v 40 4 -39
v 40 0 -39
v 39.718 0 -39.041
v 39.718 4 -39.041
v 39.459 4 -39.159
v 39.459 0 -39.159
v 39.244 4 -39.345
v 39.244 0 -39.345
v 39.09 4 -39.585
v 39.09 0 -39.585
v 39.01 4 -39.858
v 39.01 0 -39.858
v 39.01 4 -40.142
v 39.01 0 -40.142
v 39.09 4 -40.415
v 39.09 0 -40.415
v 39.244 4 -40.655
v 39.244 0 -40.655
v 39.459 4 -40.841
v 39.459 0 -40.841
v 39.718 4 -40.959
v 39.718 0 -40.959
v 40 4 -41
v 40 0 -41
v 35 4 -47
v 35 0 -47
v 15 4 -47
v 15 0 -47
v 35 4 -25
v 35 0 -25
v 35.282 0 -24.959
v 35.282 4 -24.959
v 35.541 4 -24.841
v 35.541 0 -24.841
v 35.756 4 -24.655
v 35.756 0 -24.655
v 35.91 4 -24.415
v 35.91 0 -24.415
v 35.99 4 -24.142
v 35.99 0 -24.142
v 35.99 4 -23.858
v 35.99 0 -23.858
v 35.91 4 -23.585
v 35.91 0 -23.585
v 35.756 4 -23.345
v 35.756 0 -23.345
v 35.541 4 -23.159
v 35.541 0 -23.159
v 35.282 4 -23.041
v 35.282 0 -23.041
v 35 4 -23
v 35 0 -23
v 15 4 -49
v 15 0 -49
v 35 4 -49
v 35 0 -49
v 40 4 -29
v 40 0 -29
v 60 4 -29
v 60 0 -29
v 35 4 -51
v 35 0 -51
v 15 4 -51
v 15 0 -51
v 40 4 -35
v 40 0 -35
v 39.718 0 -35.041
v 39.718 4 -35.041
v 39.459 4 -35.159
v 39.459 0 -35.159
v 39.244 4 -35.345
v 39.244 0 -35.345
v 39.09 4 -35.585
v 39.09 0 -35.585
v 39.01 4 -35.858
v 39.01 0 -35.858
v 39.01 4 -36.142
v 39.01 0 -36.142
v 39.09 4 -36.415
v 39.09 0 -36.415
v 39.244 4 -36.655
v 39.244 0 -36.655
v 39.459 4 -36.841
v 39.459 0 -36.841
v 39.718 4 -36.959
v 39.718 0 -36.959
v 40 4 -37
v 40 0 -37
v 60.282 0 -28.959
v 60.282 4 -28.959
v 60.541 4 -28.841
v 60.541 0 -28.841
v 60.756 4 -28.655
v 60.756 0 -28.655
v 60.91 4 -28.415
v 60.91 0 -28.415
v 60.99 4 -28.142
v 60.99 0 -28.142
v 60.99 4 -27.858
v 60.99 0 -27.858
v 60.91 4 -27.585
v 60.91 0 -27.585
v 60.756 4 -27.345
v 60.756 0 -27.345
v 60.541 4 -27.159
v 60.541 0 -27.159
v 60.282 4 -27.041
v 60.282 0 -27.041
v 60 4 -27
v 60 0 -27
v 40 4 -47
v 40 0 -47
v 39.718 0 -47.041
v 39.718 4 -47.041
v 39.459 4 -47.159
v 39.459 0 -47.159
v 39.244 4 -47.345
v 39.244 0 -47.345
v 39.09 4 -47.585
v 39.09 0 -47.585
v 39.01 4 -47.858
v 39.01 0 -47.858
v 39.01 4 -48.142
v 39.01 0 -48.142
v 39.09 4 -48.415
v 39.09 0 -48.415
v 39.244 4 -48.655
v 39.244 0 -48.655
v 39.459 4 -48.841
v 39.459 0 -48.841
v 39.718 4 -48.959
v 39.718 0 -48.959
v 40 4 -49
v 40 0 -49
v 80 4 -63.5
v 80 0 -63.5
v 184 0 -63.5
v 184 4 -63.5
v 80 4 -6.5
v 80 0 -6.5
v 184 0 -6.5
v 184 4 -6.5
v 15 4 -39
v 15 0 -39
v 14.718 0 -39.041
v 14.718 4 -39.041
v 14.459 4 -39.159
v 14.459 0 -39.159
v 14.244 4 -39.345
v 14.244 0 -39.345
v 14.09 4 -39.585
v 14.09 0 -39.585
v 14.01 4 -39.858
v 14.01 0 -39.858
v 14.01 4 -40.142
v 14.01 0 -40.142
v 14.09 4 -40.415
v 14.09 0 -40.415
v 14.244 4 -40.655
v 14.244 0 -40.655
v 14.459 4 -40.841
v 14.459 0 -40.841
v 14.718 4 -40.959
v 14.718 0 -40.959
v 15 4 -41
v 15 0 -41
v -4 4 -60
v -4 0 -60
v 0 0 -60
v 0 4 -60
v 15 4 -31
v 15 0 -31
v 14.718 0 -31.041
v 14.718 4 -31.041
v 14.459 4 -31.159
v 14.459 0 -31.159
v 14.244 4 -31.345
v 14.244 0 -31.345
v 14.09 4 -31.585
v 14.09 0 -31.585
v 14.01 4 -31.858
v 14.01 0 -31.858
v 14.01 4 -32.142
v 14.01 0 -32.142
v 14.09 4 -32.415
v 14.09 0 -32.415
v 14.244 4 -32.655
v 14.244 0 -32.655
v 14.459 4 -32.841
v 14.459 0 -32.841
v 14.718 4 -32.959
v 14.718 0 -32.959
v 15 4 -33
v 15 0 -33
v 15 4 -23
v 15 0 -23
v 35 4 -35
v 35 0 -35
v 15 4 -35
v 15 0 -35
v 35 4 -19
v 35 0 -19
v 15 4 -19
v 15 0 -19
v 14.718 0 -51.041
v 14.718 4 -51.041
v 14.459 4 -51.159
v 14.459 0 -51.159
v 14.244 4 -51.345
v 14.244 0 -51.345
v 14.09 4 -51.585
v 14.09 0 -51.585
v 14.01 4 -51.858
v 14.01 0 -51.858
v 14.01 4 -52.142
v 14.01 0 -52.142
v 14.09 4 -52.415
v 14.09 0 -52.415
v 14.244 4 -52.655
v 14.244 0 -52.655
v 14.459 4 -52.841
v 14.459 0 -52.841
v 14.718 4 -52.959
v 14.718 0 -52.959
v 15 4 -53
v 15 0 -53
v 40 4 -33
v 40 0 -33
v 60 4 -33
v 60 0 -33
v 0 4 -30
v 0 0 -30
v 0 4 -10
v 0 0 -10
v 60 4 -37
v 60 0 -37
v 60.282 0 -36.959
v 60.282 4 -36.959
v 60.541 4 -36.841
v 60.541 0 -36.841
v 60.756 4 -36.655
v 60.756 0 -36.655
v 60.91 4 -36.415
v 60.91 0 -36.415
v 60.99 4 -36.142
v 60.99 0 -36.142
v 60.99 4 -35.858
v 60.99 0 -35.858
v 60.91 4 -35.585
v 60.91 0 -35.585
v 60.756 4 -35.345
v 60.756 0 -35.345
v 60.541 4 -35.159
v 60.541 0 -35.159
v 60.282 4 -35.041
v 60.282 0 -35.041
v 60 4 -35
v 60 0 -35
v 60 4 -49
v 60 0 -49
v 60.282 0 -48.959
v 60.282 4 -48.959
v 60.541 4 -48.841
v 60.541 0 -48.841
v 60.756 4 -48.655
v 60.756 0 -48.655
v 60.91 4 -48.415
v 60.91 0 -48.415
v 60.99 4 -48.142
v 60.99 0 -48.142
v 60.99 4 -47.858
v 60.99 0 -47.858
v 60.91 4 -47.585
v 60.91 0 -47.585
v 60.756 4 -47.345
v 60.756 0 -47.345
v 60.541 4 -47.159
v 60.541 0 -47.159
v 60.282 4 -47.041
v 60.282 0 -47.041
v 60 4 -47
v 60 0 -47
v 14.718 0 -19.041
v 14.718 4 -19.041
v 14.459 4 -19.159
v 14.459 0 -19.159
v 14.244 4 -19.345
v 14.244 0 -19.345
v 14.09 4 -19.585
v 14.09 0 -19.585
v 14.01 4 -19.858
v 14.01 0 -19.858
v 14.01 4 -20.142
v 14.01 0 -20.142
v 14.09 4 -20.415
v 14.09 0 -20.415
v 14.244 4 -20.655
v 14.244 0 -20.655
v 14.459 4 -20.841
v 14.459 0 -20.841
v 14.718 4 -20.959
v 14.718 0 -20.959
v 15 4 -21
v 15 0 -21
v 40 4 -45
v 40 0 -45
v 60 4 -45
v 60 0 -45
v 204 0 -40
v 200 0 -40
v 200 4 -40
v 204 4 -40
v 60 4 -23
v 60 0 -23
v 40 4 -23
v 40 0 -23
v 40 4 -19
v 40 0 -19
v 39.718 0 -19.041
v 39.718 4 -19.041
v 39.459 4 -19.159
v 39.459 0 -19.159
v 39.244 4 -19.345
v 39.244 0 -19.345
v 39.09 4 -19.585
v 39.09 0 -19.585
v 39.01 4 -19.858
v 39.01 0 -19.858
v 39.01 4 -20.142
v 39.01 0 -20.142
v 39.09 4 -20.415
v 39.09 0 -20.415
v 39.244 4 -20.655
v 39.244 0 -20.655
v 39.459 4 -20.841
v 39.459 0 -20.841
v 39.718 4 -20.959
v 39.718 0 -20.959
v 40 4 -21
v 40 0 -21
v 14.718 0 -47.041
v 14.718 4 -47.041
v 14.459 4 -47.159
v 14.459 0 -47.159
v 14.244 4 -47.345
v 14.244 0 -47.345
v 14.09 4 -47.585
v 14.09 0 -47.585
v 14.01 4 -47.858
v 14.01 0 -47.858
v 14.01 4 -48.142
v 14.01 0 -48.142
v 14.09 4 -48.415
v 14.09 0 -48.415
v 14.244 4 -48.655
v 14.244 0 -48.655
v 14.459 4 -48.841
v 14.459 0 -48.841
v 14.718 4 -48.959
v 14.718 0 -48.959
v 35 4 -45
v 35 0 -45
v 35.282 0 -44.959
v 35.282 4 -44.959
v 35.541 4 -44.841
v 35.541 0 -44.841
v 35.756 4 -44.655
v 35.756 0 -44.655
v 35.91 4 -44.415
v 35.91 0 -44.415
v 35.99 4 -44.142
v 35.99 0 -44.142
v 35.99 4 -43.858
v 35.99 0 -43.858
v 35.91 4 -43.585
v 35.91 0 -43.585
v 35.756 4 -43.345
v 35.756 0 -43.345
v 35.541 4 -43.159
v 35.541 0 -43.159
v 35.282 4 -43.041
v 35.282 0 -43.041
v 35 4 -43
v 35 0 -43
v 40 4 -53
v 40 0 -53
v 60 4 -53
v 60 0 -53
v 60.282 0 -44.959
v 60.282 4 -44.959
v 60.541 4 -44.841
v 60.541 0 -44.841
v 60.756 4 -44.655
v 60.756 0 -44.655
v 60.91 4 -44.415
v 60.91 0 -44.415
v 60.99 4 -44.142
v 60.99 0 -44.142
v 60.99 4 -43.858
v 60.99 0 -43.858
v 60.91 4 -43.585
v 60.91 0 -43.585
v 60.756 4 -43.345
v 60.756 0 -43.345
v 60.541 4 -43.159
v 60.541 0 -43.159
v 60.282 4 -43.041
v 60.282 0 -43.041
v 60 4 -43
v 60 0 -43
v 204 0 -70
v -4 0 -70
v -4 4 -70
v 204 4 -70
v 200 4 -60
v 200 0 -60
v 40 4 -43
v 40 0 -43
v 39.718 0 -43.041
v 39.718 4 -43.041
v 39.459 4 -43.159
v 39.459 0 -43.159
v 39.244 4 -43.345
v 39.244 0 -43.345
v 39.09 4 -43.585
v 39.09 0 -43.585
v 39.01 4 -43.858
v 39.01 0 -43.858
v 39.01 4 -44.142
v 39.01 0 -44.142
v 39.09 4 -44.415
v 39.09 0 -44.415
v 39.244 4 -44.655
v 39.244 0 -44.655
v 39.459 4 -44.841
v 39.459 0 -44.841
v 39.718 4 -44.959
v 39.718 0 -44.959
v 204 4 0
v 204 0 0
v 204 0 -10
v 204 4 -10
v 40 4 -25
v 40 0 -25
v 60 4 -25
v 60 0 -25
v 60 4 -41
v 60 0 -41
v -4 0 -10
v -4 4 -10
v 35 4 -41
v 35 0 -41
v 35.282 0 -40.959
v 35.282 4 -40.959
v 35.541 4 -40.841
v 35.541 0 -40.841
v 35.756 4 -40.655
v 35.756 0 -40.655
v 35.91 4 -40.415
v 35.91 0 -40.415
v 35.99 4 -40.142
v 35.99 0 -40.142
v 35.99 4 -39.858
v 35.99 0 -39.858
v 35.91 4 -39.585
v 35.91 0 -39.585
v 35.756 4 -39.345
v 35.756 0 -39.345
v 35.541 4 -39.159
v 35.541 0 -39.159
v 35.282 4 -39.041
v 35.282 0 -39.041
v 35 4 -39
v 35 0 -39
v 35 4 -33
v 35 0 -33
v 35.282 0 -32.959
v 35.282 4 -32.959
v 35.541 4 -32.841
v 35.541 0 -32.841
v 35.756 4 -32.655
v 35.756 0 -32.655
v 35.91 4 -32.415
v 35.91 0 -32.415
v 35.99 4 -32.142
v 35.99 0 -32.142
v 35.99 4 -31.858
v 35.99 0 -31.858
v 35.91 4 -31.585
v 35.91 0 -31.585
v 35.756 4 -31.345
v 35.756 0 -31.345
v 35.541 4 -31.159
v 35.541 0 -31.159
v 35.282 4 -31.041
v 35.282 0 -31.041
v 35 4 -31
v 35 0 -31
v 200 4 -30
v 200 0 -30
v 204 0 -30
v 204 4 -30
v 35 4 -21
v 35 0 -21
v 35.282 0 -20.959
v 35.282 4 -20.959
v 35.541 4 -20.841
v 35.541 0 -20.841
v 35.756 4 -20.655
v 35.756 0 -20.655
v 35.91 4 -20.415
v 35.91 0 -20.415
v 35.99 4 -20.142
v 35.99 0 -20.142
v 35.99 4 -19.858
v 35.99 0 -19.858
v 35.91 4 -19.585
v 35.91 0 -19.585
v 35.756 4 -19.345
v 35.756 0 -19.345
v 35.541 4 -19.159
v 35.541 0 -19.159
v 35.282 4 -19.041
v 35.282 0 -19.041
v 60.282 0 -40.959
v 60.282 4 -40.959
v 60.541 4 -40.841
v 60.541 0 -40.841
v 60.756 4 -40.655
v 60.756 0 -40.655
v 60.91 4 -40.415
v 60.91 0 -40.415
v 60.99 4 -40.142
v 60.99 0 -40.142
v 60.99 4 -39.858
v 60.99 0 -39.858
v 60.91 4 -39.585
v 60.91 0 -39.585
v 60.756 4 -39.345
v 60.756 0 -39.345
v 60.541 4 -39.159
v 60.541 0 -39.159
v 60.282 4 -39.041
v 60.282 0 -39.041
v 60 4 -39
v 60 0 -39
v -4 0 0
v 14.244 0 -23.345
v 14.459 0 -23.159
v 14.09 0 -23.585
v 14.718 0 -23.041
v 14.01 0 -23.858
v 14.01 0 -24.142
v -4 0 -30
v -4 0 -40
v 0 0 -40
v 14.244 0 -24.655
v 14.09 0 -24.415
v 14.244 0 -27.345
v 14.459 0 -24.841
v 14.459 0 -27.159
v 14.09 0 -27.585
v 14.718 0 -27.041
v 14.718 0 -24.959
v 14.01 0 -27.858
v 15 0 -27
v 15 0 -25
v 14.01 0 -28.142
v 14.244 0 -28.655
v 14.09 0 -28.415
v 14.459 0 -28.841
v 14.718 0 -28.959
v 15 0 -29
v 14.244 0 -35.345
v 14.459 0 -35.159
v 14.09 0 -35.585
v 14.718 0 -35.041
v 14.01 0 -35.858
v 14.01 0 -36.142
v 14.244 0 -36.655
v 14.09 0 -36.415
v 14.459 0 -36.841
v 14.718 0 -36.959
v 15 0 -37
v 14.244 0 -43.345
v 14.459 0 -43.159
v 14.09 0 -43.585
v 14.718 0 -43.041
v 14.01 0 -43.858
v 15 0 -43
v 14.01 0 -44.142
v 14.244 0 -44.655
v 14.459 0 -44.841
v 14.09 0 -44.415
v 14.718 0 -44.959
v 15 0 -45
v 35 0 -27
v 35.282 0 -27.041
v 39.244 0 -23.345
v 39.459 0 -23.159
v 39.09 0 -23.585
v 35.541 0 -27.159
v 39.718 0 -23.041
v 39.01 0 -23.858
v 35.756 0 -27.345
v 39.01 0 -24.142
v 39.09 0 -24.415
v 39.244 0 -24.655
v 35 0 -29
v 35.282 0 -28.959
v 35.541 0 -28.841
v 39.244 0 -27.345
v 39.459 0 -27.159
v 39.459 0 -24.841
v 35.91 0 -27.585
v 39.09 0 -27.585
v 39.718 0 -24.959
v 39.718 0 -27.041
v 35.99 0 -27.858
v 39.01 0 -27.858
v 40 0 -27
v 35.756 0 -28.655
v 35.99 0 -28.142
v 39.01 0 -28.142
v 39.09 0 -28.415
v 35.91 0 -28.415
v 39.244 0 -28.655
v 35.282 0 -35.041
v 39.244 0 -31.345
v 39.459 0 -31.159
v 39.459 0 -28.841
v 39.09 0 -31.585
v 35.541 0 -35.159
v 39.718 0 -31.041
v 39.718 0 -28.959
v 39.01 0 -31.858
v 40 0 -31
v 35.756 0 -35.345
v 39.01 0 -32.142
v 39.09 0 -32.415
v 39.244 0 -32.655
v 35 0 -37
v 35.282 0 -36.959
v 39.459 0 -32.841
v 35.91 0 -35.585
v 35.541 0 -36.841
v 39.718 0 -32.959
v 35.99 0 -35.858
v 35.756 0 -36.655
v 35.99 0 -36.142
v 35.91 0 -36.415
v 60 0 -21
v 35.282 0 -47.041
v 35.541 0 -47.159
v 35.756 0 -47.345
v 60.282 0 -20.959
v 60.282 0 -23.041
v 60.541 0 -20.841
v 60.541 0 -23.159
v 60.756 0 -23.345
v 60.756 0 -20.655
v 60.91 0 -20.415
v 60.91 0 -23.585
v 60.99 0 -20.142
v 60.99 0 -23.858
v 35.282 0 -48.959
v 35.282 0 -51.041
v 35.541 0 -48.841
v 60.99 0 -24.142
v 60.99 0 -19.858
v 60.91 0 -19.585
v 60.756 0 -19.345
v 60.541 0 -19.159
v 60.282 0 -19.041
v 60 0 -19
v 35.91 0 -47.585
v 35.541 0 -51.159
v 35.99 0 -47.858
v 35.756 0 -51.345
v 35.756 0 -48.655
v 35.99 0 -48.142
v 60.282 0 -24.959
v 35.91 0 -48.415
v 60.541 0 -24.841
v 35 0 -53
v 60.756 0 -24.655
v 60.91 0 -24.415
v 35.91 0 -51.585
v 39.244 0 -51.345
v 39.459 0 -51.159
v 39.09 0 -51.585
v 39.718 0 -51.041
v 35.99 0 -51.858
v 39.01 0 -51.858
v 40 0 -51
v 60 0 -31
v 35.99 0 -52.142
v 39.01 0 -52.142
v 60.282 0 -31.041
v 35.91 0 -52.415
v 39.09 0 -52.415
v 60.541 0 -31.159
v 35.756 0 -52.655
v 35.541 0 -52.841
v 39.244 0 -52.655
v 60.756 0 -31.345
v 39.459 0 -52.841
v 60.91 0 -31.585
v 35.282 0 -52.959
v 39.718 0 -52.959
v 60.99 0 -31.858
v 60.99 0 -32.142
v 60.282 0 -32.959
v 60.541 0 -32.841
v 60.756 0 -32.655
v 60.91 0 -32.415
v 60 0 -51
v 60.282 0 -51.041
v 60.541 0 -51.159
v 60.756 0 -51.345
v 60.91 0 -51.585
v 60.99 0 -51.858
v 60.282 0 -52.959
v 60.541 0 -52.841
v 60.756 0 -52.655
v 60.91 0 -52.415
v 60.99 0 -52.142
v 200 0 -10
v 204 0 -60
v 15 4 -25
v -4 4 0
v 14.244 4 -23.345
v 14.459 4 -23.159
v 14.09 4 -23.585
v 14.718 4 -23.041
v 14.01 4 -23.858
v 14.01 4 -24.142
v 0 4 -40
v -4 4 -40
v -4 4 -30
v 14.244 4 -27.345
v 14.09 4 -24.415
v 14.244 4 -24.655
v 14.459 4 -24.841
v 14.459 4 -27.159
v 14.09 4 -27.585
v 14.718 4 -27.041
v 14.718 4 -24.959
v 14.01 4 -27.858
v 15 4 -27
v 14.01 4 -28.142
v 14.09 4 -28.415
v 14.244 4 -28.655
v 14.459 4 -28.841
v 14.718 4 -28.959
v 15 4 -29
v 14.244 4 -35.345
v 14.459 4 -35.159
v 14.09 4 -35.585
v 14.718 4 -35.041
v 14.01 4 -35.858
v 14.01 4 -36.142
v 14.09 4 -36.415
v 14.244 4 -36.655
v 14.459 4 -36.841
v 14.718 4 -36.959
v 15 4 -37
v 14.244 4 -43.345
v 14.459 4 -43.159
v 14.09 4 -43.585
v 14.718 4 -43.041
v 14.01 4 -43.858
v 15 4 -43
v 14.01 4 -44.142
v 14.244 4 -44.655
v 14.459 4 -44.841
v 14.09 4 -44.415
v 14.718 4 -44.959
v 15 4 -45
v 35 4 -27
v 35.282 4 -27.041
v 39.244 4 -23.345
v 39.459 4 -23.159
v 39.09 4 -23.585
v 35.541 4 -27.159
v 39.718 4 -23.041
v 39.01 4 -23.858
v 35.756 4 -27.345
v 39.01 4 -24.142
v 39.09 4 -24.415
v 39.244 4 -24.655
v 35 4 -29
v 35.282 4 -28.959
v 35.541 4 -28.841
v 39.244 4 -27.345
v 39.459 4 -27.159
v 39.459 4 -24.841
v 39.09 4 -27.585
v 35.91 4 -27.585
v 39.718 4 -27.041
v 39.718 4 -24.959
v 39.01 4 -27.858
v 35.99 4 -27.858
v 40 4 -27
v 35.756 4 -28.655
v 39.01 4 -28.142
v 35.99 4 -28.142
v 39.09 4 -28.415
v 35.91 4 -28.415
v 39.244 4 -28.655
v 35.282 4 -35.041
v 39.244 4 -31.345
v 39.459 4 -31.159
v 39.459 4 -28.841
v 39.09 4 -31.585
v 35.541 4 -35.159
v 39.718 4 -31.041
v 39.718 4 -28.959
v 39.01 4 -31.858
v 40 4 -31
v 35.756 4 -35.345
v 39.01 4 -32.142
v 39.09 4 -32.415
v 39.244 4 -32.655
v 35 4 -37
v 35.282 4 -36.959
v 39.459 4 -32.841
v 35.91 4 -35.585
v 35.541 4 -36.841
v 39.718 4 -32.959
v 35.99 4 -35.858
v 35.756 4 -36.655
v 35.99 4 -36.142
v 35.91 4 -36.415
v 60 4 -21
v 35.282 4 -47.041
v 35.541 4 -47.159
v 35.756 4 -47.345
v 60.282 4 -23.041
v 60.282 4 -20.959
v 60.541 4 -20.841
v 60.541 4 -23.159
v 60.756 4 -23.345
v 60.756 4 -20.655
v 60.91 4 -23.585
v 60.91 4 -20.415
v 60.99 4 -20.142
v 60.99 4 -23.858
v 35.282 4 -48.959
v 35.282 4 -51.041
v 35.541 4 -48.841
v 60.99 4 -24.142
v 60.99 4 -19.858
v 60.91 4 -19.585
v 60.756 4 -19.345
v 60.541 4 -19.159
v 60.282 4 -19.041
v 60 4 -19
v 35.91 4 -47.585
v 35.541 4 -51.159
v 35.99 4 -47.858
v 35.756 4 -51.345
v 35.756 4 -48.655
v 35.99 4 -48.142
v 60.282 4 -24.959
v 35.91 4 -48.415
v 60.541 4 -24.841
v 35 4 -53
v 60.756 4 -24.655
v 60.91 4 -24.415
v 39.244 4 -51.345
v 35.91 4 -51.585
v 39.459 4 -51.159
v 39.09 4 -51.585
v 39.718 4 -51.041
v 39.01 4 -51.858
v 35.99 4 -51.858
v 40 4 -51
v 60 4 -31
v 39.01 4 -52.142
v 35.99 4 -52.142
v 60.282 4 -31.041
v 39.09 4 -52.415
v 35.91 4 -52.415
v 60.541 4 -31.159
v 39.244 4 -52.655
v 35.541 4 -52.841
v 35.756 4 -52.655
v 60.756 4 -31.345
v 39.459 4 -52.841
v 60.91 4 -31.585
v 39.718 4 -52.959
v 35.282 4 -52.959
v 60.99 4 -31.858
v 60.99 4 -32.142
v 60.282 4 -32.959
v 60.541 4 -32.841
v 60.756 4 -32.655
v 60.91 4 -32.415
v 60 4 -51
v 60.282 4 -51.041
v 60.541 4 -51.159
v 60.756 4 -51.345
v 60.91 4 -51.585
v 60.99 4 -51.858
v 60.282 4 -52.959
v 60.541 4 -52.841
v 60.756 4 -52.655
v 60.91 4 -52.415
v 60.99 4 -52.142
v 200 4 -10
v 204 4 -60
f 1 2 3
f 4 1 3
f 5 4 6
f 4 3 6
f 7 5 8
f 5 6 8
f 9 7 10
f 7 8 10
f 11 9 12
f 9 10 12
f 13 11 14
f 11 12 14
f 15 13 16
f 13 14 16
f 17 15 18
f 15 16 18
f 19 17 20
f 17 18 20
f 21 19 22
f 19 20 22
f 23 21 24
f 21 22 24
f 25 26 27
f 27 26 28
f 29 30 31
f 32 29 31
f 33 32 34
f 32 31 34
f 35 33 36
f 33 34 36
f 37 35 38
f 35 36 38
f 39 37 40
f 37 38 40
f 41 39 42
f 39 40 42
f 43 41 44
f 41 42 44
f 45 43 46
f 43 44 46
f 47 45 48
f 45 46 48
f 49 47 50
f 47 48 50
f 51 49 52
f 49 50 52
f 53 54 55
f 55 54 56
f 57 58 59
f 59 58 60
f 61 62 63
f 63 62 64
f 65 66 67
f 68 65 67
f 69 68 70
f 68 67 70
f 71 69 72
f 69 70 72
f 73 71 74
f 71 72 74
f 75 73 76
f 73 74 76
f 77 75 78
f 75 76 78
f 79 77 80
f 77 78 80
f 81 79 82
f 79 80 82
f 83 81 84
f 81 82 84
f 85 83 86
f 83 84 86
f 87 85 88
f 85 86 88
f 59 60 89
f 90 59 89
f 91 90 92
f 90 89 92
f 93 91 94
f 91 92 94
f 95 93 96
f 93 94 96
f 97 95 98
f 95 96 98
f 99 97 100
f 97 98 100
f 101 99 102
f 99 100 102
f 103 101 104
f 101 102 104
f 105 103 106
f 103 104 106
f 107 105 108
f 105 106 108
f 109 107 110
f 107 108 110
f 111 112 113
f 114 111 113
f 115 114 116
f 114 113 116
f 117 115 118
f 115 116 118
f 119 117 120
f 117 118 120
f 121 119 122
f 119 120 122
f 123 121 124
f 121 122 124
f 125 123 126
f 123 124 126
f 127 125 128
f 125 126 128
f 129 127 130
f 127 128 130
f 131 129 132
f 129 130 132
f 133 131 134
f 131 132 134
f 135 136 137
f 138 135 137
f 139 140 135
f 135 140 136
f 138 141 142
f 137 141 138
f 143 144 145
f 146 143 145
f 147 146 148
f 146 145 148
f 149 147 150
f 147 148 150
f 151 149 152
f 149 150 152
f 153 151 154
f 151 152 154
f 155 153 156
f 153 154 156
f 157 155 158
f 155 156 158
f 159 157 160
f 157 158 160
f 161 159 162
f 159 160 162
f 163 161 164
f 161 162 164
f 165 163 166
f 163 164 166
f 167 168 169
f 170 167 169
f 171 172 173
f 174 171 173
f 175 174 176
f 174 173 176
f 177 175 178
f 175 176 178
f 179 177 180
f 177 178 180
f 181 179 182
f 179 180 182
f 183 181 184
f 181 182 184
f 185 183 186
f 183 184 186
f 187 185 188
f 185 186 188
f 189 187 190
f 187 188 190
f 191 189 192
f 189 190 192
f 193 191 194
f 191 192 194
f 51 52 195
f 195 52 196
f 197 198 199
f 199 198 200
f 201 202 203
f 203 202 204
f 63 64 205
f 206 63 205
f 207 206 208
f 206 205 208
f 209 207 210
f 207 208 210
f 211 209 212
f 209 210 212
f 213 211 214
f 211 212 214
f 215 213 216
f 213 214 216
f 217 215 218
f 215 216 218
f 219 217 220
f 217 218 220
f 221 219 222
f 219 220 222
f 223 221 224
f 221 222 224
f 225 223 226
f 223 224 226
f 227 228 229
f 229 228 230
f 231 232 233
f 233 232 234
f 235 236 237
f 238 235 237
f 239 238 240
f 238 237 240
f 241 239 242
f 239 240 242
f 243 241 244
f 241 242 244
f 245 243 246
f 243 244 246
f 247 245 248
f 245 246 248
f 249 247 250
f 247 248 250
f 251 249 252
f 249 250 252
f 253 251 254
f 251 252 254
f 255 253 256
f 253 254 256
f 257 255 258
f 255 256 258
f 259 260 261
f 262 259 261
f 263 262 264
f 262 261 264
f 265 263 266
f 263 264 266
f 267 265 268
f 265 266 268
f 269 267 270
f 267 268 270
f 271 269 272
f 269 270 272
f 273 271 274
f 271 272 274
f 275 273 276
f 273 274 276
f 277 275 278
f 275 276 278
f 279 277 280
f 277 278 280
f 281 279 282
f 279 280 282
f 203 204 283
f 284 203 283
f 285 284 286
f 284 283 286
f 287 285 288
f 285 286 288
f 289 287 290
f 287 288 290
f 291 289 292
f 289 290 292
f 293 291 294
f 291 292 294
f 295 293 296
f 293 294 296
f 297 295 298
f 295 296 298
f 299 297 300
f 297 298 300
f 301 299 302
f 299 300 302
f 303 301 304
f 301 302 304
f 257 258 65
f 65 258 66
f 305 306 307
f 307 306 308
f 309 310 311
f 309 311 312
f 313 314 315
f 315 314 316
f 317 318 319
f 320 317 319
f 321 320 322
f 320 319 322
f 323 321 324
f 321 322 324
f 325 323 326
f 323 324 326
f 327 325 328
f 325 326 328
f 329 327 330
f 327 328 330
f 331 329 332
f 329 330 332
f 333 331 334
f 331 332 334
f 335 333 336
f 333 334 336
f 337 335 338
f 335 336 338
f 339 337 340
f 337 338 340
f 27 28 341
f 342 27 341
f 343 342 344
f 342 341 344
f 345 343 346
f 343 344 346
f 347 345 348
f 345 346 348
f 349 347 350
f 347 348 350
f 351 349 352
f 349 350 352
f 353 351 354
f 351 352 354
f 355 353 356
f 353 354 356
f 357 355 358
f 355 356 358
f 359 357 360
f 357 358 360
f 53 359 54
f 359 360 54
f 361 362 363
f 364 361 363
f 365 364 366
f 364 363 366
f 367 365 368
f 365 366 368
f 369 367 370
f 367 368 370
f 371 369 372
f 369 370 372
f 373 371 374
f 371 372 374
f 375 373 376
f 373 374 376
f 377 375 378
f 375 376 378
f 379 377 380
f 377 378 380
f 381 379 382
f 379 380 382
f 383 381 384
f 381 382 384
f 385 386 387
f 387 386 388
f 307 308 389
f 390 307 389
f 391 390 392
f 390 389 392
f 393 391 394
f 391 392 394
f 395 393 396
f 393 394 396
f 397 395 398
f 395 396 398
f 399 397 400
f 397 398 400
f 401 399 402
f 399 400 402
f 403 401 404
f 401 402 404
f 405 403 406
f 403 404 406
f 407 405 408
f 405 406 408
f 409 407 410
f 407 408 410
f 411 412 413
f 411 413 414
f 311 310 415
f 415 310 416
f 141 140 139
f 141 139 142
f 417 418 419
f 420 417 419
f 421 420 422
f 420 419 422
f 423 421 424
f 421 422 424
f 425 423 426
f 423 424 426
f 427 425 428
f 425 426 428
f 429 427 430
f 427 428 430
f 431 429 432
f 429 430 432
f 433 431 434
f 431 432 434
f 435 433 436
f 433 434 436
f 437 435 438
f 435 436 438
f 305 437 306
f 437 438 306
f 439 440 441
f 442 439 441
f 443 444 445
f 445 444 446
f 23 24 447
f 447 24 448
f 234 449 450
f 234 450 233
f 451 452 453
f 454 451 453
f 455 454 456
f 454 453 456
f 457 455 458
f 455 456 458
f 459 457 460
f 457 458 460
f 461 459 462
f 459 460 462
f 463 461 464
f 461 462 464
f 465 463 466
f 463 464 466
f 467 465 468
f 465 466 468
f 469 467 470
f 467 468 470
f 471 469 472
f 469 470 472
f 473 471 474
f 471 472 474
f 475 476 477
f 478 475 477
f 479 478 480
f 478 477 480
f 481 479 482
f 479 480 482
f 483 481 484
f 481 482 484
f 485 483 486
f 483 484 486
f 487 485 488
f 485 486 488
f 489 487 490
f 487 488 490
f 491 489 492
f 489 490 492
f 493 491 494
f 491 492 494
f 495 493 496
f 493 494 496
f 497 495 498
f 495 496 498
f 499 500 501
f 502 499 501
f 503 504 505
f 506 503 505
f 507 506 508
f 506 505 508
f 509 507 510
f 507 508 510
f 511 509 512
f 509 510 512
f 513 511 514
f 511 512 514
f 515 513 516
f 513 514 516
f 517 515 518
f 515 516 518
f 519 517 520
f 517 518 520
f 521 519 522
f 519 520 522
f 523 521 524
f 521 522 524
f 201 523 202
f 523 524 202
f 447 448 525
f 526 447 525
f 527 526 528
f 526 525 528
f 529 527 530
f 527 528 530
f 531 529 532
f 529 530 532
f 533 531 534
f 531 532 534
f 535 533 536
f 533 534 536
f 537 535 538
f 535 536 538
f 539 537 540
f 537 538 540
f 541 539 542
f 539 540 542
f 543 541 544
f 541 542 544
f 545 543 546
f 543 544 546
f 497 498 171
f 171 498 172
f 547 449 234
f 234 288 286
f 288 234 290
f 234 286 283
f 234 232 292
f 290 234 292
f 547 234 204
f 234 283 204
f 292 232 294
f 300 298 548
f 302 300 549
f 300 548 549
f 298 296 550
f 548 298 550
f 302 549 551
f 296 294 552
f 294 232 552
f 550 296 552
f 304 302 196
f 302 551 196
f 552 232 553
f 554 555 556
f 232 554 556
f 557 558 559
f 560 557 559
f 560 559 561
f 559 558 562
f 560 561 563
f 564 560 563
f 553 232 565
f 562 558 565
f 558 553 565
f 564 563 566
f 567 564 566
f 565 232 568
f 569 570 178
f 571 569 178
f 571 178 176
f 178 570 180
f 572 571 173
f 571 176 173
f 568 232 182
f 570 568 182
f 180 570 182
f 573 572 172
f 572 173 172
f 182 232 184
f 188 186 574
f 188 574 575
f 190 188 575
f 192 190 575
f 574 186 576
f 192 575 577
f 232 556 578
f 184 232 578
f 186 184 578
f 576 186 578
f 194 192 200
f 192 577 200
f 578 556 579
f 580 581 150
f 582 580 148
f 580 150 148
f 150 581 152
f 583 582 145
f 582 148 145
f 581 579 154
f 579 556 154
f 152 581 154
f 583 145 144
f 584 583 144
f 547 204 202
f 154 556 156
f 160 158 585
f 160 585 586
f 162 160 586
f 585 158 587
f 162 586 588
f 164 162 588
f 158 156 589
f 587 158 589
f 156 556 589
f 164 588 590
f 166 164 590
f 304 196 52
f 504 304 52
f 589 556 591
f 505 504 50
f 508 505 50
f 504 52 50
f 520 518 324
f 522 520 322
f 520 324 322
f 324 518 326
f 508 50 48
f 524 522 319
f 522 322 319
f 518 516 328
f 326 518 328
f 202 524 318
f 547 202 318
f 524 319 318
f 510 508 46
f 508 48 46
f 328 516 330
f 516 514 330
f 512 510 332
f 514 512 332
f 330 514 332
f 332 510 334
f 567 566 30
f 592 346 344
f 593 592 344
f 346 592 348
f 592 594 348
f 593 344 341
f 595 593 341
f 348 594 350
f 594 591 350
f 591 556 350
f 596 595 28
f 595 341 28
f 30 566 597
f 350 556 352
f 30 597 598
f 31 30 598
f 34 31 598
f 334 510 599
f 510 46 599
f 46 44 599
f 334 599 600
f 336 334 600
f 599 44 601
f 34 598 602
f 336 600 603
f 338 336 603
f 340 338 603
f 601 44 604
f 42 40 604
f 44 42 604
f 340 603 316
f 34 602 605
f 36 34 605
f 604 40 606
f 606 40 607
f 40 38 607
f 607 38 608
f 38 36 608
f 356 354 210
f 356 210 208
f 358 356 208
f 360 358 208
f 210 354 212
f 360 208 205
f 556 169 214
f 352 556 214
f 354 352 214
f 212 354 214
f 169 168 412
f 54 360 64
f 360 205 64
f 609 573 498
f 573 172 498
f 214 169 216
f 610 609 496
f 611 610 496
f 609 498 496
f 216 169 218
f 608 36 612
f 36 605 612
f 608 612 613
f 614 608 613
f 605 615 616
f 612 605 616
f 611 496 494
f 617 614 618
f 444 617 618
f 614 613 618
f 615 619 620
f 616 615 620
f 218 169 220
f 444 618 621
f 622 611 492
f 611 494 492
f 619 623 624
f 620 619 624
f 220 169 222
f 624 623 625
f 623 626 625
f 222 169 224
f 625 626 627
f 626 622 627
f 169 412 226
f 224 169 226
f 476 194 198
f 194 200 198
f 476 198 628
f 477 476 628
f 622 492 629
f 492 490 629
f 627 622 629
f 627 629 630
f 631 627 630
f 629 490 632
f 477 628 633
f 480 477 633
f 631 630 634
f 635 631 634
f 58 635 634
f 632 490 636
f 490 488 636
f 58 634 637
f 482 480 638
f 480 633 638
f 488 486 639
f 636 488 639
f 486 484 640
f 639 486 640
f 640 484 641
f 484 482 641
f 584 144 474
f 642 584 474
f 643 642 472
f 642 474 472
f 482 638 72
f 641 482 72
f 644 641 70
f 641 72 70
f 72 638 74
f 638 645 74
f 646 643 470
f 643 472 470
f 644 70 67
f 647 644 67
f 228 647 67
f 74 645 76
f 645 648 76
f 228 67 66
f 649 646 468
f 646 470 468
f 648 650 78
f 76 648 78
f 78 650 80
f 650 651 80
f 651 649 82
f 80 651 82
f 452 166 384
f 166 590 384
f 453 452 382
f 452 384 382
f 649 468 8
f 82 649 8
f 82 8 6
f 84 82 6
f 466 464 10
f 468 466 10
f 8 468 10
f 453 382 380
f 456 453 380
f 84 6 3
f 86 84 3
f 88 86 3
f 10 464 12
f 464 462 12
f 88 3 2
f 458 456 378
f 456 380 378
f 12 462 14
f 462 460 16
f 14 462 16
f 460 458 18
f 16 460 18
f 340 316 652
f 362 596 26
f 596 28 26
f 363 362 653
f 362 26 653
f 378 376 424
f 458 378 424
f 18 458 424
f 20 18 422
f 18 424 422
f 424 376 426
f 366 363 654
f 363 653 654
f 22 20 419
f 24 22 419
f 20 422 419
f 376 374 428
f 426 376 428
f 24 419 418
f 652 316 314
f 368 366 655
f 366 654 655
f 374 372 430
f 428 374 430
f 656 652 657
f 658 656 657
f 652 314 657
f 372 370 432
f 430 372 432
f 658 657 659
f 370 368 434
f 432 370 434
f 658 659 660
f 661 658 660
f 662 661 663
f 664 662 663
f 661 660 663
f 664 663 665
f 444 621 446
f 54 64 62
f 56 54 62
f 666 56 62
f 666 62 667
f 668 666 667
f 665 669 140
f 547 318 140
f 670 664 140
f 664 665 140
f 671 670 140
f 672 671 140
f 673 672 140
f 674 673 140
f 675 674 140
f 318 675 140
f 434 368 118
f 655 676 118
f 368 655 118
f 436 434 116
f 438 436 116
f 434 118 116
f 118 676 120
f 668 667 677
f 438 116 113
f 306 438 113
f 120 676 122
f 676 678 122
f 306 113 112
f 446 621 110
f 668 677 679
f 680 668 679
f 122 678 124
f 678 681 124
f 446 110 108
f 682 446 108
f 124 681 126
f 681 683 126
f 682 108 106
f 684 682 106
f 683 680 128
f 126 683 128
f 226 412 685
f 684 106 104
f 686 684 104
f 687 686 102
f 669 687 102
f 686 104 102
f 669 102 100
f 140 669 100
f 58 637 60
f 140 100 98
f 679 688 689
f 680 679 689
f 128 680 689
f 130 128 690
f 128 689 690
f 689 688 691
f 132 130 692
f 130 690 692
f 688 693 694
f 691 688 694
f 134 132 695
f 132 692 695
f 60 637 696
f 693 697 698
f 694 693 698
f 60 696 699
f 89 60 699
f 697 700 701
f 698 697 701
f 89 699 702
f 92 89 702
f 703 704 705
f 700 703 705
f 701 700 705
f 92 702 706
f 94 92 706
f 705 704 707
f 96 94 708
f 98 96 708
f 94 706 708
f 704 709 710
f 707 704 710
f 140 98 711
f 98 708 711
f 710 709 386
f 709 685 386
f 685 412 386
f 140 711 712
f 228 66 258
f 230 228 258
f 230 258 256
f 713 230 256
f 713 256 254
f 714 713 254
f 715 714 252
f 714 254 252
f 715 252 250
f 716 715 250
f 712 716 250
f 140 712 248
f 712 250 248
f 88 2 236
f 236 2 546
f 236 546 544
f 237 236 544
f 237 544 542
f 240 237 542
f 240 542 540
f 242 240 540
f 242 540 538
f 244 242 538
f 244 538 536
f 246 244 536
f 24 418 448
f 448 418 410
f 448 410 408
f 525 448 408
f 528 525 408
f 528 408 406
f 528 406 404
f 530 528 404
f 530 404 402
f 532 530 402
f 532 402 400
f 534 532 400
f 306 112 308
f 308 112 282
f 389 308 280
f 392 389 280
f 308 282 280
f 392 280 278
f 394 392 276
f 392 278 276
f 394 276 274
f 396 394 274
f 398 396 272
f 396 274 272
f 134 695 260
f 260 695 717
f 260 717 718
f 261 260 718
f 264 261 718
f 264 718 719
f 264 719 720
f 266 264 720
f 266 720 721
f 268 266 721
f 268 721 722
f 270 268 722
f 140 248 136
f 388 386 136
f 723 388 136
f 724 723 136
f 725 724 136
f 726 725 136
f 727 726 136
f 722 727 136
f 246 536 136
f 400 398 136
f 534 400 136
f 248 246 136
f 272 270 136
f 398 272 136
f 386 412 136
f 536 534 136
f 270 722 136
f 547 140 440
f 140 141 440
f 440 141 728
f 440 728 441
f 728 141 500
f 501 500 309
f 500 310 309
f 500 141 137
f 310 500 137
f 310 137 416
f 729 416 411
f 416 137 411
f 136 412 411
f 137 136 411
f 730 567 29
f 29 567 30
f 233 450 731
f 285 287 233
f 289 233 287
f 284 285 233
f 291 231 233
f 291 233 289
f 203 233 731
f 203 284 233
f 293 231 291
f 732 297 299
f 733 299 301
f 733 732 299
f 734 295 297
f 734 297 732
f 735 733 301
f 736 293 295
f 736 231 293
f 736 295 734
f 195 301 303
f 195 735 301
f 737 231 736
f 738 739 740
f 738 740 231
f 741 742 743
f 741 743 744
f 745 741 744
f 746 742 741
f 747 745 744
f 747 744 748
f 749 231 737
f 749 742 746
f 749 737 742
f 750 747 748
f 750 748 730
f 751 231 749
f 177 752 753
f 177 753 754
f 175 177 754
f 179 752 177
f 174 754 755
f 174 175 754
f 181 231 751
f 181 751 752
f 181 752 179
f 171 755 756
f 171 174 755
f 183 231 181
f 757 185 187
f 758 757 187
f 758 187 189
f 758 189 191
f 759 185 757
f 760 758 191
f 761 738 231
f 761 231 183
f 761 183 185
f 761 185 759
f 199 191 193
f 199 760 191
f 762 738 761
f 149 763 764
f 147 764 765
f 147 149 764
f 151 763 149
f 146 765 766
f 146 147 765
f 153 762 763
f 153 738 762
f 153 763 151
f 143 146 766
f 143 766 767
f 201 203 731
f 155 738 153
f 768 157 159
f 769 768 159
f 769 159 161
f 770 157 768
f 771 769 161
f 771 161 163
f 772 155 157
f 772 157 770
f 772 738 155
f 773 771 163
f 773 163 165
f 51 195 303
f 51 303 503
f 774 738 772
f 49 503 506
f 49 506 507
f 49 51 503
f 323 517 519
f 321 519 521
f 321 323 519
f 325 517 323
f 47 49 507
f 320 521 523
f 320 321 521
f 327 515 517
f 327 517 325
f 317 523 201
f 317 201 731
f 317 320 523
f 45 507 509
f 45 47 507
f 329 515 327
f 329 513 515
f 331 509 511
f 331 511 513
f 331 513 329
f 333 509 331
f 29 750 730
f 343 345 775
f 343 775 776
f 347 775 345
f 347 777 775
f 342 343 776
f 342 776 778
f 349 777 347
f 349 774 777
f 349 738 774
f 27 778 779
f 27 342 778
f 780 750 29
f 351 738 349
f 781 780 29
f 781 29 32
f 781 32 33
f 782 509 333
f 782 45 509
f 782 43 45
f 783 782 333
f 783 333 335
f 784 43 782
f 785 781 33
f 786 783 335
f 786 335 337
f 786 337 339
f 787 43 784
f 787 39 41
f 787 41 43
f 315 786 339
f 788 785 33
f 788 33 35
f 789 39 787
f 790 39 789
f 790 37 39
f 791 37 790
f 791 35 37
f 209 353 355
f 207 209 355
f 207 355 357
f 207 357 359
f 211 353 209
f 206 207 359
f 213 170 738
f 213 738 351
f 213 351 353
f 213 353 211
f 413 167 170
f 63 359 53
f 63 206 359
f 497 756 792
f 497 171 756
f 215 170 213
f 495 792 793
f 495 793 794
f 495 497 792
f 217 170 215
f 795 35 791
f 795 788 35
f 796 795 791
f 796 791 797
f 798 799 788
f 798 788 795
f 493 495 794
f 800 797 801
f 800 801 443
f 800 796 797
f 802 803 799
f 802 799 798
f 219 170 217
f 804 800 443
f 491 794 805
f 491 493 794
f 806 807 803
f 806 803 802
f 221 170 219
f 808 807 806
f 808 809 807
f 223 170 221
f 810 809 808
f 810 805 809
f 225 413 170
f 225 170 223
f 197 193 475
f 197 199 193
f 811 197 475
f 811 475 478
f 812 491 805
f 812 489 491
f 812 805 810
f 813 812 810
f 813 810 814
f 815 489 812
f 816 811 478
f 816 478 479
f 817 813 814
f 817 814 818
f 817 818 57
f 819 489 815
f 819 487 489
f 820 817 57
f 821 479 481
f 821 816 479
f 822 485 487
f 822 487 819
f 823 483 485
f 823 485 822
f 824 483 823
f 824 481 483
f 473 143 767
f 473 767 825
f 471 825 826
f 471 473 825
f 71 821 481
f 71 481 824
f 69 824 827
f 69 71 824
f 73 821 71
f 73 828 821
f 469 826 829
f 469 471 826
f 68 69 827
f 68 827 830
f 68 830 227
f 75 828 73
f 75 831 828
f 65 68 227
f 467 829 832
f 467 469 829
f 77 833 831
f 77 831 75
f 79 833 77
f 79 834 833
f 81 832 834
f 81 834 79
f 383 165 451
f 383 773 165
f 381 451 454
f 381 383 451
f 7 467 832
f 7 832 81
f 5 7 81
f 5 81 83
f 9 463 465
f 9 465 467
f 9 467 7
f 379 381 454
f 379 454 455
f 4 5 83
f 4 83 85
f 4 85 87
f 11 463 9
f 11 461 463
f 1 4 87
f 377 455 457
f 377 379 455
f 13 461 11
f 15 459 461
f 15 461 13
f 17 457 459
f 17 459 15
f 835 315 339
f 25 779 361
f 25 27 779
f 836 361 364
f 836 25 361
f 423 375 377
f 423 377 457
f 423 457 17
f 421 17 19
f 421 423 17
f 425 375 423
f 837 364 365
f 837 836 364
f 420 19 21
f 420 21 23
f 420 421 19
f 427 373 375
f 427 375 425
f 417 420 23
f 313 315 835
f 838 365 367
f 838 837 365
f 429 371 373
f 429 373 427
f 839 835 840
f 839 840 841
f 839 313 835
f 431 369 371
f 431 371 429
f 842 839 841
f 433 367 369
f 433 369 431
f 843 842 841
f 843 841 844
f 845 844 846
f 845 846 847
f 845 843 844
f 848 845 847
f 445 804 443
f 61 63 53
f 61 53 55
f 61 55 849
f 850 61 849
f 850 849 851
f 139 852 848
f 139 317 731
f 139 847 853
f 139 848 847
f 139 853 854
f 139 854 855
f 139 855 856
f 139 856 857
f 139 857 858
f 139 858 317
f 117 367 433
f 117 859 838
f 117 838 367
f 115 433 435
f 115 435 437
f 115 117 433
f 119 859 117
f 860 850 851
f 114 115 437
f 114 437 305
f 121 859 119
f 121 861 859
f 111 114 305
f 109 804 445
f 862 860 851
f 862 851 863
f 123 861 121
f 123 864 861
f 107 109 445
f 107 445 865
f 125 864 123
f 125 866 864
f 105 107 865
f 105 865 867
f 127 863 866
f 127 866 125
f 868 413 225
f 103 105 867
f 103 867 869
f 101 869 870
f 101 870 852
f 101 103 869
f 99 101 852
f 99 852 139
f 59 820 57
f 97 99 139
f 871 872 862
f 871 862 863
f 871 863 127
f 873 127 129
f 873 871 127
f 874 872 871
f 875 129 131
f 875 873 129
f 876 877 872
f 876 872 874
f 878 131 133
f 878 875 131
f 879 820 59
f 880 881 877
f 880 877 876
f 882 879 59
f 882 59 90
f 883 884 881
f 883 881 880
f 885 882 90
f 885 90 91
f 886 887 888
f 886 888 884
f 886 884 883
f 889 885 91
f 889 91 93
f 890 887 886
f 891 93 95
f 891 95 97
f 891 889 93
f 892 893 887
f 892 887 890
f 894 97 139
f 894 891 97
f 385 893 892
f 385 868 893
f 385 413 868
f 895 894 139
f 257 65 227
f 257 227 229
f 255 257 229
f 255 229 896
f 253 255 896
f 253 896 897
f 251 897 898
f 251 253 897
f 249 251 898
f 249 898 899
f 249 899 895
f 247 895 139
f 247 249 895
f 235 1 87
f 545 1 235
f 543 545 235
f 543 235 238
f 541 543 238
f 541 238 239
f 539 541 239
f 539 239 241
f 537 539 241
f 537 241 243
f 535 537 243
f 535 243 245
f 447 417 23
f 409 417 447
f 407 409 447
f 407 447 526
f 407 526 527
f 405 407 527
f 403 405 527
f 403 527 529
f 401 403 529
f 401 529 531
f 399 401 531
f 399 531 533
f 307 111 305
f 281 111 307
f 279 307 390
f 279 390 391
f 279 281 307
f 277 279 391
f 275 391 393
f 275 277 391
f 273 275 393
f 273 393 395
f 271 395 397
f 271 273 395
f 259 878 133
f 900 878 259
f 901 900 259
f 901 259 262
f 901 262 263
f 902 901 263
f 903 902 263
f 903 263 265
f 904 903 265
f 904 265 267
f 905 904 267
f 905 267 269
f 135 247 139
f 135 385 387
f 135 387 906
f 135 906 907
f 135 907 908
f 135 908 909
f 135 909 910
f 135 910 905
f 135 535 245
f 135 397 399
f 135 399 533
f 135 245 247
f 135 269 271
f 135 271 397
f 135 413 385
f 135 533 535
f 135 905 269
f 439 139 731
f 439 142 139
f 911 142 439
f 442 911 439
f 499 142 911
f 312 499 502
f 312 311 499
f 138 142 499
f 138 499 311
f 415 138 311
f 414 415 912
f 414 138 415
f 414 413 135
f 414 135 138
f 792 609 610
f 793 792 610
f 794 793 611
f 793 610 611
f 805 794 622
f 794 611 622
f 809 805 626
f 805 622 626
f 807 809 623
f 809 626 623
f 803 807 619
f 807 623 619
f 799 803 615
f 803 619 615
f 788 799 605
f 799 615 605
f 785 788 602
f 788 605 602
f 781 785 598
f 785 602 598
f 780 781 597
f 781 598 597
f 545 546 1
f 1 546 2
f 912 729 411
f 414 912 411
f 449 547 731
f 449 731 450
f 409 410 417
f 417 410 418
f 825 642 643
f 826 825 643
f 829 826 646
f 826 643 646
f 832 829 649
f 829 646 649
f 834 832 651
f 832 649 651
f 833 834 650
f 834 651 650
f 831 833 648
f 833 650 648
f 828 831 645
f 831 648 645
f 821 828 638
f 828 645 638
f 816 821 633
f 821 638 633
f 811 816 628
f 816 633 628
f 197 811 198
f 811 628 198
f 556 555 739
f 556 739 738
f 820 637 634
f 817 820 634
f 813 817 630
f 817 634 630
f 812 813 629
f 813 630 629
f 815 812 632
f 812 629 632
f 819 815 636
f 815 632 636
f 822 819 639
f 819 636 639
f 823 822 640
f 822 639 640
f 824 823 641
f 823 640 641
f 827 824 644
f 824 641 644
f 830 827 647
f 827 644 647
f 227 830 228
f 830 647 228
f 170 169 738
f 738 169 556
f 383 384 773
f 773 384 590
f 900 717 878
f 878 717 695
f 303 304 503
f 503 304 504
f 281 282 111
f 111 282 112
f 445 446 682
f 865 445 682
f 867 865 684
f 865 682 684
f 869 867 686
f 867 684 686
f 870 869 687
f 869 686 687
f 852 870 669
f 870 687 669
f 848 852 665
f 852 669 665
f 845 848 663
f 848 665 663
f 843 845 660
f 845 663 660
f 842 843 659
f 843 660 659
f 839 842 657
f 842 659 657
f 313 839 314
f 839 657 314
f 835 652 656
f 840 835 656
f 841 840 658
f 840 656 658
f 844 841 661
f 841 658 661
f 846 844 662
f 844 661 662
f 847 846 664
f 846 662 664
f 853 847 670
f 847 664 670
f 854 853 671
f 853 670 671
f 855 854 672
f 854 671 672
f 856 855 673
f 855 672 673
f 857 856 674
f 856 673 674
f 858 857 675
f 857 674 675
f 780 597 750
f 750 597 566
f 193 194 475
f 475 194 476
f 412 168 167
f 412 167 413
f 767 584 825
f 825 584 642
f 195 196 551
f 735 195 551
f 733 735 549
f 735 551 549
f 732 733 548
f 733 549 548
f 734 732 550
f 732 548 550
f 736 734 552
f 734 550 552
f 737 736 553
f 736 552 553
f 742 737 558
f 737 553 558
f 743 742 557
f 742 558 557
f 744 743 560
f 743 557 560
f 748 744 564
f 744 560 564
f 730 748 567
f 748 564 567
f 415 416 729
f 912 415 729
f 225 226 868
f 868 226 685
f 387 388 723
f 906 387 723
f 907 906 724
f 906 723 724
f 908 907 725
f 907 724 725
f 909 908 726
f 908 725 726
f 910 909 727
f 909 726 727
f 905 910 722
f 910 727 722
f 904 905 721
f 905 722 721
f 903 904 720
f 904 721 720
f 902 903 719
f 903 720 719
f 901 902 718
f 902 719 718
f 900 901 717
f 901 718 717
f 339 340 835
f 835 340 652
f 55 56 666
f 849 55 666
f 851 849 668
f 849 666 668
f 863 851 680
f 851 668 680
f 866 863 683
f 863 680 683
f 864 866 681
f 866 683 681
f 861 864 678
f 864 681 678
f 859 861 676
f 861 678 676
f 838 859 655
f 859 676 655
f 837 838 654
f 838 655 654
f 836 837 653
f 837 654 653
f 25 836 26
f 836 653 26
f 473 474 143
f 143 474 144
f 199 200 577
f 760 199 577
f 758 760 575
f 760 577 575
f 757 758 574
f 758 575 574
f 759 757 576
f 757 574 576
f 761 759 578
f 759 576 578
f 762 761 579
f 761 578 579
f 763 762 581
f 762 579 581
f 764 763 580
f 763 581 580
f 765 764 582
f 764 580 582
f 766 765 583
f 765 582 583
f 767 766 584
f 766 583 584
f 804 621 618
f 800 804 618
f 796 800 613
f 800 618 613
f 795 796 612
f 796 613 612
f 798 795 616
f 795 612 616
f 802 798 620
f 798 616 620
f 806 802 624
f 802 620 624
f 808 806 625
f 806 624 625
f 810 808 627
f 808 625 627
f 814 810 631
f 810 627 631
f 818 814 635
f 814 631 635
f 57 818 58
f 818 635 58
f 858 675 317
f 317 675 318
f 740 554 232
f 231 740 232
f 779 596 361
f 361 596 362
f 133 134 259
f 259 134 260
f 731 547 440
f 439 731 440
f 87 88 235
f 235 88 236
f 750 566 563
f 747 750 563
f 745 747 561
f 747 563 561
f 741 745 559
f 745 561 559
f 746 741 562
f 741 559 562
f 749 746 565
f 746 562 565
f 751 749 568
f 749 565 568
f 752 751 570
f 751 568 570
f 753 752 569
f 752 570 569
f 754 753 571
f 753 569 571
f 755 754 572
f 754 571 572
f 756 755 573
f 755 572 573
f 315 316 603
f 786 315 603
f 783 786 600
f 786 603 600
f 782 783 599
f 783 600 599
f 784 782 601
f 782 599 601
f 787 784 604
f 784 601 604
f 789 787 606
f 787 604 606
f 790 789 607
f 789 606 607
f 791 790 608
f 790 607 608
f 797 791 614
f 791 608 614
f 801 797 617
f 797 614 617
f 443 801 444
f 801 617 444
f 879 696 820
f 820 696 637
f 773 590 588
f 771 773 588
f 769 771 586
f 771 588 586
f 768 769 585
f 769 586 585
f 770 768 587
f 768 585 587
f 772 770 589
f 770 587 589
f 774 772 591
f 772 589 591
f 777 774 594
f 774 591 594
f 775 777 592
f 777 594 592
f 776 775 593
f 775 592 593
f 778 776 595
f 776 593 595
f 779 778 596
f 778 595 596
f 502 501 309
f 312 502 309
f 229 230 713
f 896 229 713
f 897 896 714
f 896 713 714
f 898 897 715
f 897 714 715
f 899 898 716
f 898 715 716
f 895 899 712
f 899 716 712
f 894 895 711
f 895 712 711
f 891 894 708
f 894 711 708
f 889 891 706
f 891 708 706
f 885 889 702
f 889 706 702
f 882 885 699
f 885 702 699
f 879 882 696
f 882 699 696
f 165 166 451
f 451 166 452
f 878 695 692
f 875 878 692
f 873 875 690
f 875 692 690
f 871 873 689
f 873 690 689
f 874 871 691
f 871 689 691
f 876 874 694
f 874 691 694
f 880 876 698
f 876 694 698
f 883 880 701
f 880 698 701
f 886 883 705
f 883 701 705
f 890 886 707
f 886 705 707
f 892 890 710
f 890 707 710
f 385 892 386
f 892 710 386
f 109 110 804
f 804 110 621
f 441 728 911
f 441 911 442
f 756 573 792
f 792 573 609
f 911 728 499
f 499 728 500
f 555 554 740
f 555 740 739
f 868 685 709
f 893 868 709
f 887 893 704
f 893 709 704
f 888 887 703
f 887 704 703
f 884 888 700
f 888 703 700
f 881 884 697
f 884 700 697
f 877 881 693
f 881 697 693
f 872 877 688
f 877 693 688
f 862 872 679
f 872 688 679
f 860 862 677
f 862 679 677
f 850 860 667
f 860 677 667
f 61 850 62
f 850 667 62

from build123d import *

# Parameters (mm, degrees)
SKETCH1_W           = 104
SKETCH1_H           = 57
SKETCH1_W_2         = 4
SKETCH1_H_2         = 10
BOSS_EXTRUDE1_DEPTH = 4


with BuildPart() as part:
    # Sketch1 → Boss-Extrude1 (new body)
    # profile 1 of 7: a face of its own
    with BuildSketch(Plane(origin=(0, 0, 0), x_dir=(1, 0, 0), z_dir=(0, 1, 0))):
        Polygon((0, 10), (0, 0), (200, 0), (200, 10), (200, 30), (200, 40), (200, 60), (200, 70), (0, 70), (0, 60), (0, 40), (0, 30), align=None)
        with BuildLine():
            ThreePointArc((35, 21), (36, 20), (35, 19))
            Line((35, 19), (15, 19))
            ThreePointArc((15, 19), (14, 20), (15, 21))
            Line((15, 21), (35, 21))
        make_face(mode=Mode.SUBTRACT)
        with BuildLine():
            ThreePointArc((35, 25), (36, 24), (35, 23))
            Line((35, 23), (15, 23))
            ThreePointArc((15, 23), (14, 24), (15, 25))
            Line((15, 25), (35, 25))
        make_face(mode=Mode.SUBTRACT)
        with BuildLine():
            ThreePointArc((35, 29), (36, 28), (35, 27))
            Line((35, 27), (15, 27))
            ThreePointArc((15, 27), (14, 28), (15, 29))
            Line((15, 29), (35, 29))
        make_face(mode=Mode.SUBTRACT)
        with BuildLine():
            ThreePointArc((35, 33), (36, 32), (35, 31))
            Line((35, 31), (15, 31))
            ThreePointArc((15, 31), (14, 32), (15, 33))
            Line((15, 33), (35, 33))
        make_face(mode=Mode.SUBTRACT)
        with BuildLine():
            ThreePointArc((60, 21), (61, 20), (60, 19))
            Line((60, 19), (40, 19))
            ThreePointArc((40, 19), (39, 20), (40, 21))
            Line((40, 21), (60, 21))
        make_face(mode=Mode.SUBTRACT)
        with BuildLine():
            ThreePointArc((60, 25), (61, 24), (60, 23))
            Line((60, 23), (40, 23))
            ThreePointArc((40, 23), (39, 24), (40, 25))
            Line((40, 25), (60, 25))
        make_face(mode=Mode.SUBTRACT)
        with BuildLine():
            ThreePointArc((60, 29), (61, 28), (60, 27))
            Line((60, 27), (40, 27))
            ThreePointArc((40, 27), (39, 28), (40, 29))
            Line((40, 29), (60, 29))
        make_face(mode=Mode.SUBTRACT)
        with BuildLine():
            ThreePointArc((60, 33), (61, 32), (60, 31))
            Line((60, 31), (40, 31))
            ThreePointArc((40, 31), (39, 32), (40, 33))
            Line((40, 33), (60, 33))
        make_face(mode=Mode.SUBTRACT)
        with BuildLine():
            ThreePointArc((35, 37), (36, 36), (35, 35))
            Line((35, 35), (15, 35))
            ThreePointArc((15, 35), (14, 36), (15, 37))
            Line((15, 37), (35, 37))
        make_face(mode=Mode.SUBTRACT)
        with BuildLine():
            ThreePointArc((35, 41), (36, 40), (35, 39))
            Line((35, 39), (15, 39))
            ThreePointArc((15, 39), (14, 40), (15, 41))
            Line((15, 41), (35, 41))
        make_face(mode=Mode.SUBTRACT)
        with BuildLine():
            ThreePointArc((35, 45), (36, 44), (35, 43))
            Line((35, 43), (15, 43))
            ThreePointArc((15, 43), (14, 44), (15, 45))
            Line((15, 45), (35, 45))
        make_face(mode=Mode.SUBTRACT)
        with BuildLine():
            ThreePointArc((35, 49), (36, 48), (35, 47))
            Line((35, 47), (15, 47))
            ThreePointArc((15, 47), (14, 48), (15, 49))
            Line((15, 49), (35, 49))
        make_face(mode=Mode.SUBTRACT)
        with BuildLine():
            ThreePointArc((35, 53), (36, 52), (35, 51))
            Line((35, 51), (15, 51))
            ThreePointArc((15, 51), (14, 52), (15, 53))
            Line((15, 53), (35, 53))
        make_face(mode=Mode.SUBTRACT)
        with BuildLine():
            ThreePointArc((60, 37), (61, 36), (60, 35))
            Line((60, 35), (40, 35))
            ThreePointArc((40, 35), (39, 36), (40, 37))
            Line((40, 37), (60, 37))
        make_face(mode=Mode.SUBTRACT)
        with BuildLine():
            ThreePointArc((60, 41), (61, 40), (60, 39))
            Line((60, 39), (40, 39))
            ThreePointArc((40, 39), (39, 40), (40, 41))
            Line((40, 41), (60, 41))
        make_face(mode=Mode.SUBTRACT)
        with BuildLine():
            ThreePointArc((60, 45), (61, 44), (60, 43))
            Line((60, 43), (40, 43))
            ThreePointArc((40, 43), (39, 44), (40, 45))
            Line((40, 45), (60, 45))
        make_face(mode=Mode.SUBTRACT)
        with BuildLine():
            ThreePointArc((60, 49), (61, 48), (60, 47))
            Line((60, 47), (40, 47))
            ThreePointArc((40, 47), (39, 48), (40, 49))
            Line((40, 49), (60, 49))
        make_face(mode=Mode.SUBTRACT)
        with BuildLine():
            ThreePointArc((60, 53), (61, 52), (60, 51))
            Line((60, 51), (40, 51))
            ThreePointArc((40, 51), (39, 52), (40, 53))
            Line((40, 53), (60, 53))
        make_face(mode=Mode.SUBTRACT)
        with Locations((132, 35)):
            Rectangle(SKETCH1_W, SKETCH1_H, mode=Mode.SUBTRACT)
    # profile 2 of 7: a face of its own
    with BuildSketch(Plane(origin=(0, 0, 0), x_dir=(1, 0, 0), z_dir=(0, 1, 0))):
        with Locations((-2, 5)):
            Rectangle(SKETCH1_W_2, SKETCH1_H_2)
    # profile 3 of 7: a face of its own
    with BuildSketch(Plane(origin=(0, 0, 0), x_dir=(1, 0, 0), z_dir=(0, 1, 0))):
        with Locations((202, 5)):
            Rectangle(SKETCH1_W_2, SKETCH1_H_2)
    # profile 4 of 7: a face of its own
    with BuildSketch(Plane(origin=(0, 0, 0), x_dir=(1, 0, 0), z_dir=(0, 1, 0))):
        with Locations((-2, 35)):
            Rectangle(SKETCH1_W_2, SKETCH1_H_2)
    # profile 5 of 7: a face of its own
    with BuildSketch(Plane(origin=(0, 0, 0), x_dir=(1, 0, 0), z_dir=(0, 1, 0))):
        with Locations((202, 35)):
            Rectangle(SKETCH1_W_2, SKETCH1_H_2)
    # profile 6 of 7: a face of its own
    with BuildSketch(Plane(origin=(0, 0, 0), x_dir=(1, 0, 0), z_dir=(0, 1, 0))):
        with Locations((-2, 65)):
            Rectangle(SKETCH1_W_2, SKETCH1_H_2)
    # profile 7 of 7: a face of its own
    with BuildSketch(Plane(origin=(0, 0, 0), x_dir=(1, 0, 0), z_dir=(0, 1, 0))):
        with Locations((202, 65)):
            Rectangle(SKETCH1_W_2, SKETCH1_H_2)
    extrude(amount=BOSS_EXTRUDE1_DEPTH)


solid = part.part
